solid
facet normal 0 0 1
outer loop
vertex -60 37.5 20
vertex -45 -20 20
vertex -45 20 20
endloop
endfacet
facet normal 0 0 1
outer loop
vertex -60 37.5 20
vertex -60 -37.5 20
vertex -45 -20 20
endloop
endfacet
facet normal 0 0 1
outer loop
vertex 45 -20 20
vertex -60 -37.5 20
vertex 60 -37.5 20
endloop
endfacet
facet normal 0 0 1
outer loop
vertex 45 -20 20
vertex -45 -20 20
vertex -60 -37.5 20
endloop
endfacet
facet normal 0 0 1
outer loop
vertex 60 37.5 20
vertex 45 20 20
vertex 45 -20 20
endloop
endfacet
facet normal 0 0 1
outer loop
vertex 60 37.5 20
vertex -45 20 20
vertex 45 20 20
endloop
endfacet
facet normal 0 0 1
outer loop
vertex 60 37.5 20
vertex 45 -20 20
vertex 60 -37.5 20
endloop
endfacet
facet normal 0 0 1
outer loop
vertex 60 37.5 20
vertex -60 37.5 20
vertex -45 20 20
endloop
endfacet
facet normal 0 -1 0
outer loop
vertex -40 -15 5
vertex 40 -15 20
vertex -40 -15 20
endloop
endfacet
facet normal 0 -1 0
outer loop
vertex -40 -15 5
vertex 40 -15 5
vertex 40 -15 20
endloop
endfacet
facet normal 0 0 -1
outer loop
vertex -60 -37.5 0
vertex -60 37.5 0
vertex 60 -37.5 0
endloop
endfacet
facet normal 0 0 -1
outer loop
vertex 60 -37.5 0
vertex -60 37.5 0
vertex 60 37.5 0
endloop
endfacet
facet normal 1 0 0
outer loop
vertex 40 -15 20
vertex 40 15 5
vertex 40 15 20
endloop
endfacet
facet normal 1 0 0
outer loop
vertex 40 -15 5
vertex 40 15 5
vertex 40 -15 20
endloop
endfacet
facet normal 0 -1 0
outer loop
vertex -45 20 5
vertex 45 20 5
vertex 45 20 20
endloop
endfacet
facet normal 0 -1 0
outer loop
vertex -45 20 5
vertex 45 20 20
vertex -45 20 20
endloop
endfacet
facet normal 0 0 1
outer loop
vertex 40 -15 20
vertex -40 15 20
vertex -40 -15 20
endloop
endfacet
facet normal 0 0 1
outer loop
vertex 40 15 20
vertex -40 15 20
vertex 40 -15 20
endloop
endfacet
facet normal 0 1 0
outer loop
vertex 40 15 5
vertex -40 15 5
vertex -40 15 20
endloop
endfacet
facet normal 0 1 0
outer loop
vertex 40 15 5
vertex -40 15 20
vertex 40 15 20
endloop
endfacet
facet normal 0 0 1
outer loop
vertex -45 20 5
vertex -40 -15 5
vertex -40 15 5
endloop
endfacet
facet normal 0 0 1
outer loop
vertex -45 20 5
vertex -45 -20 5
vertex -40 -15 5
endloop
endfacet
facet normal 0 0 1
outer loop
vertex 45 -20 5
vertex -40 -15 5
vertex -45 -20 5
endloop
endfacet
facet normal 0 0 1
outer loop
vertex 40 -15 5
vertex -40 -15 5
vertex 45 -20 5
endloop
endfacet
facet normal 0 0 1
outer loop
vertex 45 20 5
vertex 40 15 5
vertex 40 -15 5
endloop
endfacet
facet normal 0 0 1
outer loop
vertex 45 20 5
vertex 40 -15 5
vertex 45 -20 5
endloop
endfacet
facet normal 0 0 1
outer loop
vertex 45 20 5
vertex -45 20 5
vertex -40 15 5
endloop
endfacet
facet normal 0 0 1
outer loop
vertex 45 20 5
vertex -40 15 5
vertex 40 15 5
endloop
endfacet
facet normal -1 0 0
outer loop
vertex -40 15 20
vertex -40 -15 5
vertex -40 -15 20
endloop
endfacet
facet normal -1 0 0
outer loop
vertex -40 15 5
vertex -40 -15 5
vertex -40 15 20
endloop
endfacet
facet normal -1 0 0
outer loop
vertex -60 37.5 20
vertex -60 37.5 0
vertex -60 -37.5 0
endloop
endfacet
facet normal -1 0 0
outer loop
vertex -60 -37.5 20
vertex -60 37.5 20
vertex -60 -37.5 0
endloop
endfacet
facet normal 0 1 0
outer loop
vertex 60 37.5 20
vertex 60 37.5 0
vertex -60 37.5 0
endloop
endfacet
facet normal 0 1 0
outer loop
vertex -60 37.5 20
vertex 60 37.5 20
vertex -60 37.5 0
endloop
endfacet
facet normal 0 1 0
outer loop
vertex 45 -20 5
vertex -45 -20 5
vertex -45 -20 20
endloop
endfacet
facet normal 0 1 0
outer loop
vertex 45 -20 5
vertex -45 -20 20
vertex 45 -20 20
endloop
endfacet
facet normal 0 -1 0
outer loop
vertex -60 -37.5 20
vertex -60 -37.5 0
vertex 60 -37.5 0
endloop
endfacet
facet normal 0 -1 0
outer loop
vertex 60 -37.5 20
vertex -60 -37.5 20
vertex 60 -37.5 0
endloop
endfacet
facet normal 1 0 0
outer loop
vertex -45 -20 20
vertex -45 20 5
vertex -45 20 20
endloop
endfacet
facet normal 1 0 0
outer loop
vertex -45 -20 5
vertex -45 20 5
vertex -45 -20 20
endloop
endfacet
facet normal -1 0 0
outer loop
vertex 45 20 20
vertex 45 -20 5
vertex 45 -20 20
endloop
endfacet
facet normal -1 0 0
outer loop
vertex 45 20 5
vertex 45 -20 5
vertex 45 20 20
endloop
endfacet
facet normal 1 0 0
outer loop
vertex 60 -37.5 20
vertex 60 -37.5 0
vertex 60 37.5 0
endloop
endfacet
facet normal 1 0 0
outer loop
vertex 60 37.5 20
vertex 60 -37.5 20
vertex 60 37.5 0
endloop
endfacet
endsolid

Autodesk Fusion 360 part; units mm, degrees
sketch "Sketch1" plane through (0, 0, 0) normal (0, 0, 1) x (1, 0, 0)
  line L0 (60, 37.5) -> (-60, 37.5)
  line L1 (-60, 37.5) -> (-60, -37.5)
  line L2 (-60, -37.5) -> (60, -37.5)
  line L3 (60, -37.5) -> (60, 37.5)
  line L4 (60, 37.5) -> (-60, -37.5) construction
  line L5 (-60, 37.5) -> (60, -37.5) construction
  line L6 (45, 20) -> (-45, 20)
  line L7 (-45, 20) -> (-45, -20)
  line L8 (-45, -20) -> (45, -20)
  line L9 (45, -20) -> (45, 20)
  line L10 (45, 20) -> (-45, -20) construction
  line L11 (-45, 20) -> (45, -20) construction
  line L12 (-40, 15) -> (40, 15)
  line L13 (40, 15) -> (40, -15)
  line L14 (40, -15) -> (-40, -15)
  line L15 (-40, -15) -> (-40, 15)
  line L16 (-40, 15) -> (40, -15) construction
  line L17 (40, 15) -> (-40, -15) construction
  dimension "d1" = 120
  dimension "d2" = 75
  dimension "d3" = 90
  dimension "d4" = 40
  dimension "d5" = 80
  dimension "d6" = 30
extrude "Extrude1" add sketch "Sketch1" along normal blind 20 makes body 1 at (15, -31.6667, 0) makes body 2 at (-13.3333, -5, 0)
extrude "Extrude2" add sketch "Sketch1" along normal blind 5 contours L6 L7 L8 L9 bodies 1 2
